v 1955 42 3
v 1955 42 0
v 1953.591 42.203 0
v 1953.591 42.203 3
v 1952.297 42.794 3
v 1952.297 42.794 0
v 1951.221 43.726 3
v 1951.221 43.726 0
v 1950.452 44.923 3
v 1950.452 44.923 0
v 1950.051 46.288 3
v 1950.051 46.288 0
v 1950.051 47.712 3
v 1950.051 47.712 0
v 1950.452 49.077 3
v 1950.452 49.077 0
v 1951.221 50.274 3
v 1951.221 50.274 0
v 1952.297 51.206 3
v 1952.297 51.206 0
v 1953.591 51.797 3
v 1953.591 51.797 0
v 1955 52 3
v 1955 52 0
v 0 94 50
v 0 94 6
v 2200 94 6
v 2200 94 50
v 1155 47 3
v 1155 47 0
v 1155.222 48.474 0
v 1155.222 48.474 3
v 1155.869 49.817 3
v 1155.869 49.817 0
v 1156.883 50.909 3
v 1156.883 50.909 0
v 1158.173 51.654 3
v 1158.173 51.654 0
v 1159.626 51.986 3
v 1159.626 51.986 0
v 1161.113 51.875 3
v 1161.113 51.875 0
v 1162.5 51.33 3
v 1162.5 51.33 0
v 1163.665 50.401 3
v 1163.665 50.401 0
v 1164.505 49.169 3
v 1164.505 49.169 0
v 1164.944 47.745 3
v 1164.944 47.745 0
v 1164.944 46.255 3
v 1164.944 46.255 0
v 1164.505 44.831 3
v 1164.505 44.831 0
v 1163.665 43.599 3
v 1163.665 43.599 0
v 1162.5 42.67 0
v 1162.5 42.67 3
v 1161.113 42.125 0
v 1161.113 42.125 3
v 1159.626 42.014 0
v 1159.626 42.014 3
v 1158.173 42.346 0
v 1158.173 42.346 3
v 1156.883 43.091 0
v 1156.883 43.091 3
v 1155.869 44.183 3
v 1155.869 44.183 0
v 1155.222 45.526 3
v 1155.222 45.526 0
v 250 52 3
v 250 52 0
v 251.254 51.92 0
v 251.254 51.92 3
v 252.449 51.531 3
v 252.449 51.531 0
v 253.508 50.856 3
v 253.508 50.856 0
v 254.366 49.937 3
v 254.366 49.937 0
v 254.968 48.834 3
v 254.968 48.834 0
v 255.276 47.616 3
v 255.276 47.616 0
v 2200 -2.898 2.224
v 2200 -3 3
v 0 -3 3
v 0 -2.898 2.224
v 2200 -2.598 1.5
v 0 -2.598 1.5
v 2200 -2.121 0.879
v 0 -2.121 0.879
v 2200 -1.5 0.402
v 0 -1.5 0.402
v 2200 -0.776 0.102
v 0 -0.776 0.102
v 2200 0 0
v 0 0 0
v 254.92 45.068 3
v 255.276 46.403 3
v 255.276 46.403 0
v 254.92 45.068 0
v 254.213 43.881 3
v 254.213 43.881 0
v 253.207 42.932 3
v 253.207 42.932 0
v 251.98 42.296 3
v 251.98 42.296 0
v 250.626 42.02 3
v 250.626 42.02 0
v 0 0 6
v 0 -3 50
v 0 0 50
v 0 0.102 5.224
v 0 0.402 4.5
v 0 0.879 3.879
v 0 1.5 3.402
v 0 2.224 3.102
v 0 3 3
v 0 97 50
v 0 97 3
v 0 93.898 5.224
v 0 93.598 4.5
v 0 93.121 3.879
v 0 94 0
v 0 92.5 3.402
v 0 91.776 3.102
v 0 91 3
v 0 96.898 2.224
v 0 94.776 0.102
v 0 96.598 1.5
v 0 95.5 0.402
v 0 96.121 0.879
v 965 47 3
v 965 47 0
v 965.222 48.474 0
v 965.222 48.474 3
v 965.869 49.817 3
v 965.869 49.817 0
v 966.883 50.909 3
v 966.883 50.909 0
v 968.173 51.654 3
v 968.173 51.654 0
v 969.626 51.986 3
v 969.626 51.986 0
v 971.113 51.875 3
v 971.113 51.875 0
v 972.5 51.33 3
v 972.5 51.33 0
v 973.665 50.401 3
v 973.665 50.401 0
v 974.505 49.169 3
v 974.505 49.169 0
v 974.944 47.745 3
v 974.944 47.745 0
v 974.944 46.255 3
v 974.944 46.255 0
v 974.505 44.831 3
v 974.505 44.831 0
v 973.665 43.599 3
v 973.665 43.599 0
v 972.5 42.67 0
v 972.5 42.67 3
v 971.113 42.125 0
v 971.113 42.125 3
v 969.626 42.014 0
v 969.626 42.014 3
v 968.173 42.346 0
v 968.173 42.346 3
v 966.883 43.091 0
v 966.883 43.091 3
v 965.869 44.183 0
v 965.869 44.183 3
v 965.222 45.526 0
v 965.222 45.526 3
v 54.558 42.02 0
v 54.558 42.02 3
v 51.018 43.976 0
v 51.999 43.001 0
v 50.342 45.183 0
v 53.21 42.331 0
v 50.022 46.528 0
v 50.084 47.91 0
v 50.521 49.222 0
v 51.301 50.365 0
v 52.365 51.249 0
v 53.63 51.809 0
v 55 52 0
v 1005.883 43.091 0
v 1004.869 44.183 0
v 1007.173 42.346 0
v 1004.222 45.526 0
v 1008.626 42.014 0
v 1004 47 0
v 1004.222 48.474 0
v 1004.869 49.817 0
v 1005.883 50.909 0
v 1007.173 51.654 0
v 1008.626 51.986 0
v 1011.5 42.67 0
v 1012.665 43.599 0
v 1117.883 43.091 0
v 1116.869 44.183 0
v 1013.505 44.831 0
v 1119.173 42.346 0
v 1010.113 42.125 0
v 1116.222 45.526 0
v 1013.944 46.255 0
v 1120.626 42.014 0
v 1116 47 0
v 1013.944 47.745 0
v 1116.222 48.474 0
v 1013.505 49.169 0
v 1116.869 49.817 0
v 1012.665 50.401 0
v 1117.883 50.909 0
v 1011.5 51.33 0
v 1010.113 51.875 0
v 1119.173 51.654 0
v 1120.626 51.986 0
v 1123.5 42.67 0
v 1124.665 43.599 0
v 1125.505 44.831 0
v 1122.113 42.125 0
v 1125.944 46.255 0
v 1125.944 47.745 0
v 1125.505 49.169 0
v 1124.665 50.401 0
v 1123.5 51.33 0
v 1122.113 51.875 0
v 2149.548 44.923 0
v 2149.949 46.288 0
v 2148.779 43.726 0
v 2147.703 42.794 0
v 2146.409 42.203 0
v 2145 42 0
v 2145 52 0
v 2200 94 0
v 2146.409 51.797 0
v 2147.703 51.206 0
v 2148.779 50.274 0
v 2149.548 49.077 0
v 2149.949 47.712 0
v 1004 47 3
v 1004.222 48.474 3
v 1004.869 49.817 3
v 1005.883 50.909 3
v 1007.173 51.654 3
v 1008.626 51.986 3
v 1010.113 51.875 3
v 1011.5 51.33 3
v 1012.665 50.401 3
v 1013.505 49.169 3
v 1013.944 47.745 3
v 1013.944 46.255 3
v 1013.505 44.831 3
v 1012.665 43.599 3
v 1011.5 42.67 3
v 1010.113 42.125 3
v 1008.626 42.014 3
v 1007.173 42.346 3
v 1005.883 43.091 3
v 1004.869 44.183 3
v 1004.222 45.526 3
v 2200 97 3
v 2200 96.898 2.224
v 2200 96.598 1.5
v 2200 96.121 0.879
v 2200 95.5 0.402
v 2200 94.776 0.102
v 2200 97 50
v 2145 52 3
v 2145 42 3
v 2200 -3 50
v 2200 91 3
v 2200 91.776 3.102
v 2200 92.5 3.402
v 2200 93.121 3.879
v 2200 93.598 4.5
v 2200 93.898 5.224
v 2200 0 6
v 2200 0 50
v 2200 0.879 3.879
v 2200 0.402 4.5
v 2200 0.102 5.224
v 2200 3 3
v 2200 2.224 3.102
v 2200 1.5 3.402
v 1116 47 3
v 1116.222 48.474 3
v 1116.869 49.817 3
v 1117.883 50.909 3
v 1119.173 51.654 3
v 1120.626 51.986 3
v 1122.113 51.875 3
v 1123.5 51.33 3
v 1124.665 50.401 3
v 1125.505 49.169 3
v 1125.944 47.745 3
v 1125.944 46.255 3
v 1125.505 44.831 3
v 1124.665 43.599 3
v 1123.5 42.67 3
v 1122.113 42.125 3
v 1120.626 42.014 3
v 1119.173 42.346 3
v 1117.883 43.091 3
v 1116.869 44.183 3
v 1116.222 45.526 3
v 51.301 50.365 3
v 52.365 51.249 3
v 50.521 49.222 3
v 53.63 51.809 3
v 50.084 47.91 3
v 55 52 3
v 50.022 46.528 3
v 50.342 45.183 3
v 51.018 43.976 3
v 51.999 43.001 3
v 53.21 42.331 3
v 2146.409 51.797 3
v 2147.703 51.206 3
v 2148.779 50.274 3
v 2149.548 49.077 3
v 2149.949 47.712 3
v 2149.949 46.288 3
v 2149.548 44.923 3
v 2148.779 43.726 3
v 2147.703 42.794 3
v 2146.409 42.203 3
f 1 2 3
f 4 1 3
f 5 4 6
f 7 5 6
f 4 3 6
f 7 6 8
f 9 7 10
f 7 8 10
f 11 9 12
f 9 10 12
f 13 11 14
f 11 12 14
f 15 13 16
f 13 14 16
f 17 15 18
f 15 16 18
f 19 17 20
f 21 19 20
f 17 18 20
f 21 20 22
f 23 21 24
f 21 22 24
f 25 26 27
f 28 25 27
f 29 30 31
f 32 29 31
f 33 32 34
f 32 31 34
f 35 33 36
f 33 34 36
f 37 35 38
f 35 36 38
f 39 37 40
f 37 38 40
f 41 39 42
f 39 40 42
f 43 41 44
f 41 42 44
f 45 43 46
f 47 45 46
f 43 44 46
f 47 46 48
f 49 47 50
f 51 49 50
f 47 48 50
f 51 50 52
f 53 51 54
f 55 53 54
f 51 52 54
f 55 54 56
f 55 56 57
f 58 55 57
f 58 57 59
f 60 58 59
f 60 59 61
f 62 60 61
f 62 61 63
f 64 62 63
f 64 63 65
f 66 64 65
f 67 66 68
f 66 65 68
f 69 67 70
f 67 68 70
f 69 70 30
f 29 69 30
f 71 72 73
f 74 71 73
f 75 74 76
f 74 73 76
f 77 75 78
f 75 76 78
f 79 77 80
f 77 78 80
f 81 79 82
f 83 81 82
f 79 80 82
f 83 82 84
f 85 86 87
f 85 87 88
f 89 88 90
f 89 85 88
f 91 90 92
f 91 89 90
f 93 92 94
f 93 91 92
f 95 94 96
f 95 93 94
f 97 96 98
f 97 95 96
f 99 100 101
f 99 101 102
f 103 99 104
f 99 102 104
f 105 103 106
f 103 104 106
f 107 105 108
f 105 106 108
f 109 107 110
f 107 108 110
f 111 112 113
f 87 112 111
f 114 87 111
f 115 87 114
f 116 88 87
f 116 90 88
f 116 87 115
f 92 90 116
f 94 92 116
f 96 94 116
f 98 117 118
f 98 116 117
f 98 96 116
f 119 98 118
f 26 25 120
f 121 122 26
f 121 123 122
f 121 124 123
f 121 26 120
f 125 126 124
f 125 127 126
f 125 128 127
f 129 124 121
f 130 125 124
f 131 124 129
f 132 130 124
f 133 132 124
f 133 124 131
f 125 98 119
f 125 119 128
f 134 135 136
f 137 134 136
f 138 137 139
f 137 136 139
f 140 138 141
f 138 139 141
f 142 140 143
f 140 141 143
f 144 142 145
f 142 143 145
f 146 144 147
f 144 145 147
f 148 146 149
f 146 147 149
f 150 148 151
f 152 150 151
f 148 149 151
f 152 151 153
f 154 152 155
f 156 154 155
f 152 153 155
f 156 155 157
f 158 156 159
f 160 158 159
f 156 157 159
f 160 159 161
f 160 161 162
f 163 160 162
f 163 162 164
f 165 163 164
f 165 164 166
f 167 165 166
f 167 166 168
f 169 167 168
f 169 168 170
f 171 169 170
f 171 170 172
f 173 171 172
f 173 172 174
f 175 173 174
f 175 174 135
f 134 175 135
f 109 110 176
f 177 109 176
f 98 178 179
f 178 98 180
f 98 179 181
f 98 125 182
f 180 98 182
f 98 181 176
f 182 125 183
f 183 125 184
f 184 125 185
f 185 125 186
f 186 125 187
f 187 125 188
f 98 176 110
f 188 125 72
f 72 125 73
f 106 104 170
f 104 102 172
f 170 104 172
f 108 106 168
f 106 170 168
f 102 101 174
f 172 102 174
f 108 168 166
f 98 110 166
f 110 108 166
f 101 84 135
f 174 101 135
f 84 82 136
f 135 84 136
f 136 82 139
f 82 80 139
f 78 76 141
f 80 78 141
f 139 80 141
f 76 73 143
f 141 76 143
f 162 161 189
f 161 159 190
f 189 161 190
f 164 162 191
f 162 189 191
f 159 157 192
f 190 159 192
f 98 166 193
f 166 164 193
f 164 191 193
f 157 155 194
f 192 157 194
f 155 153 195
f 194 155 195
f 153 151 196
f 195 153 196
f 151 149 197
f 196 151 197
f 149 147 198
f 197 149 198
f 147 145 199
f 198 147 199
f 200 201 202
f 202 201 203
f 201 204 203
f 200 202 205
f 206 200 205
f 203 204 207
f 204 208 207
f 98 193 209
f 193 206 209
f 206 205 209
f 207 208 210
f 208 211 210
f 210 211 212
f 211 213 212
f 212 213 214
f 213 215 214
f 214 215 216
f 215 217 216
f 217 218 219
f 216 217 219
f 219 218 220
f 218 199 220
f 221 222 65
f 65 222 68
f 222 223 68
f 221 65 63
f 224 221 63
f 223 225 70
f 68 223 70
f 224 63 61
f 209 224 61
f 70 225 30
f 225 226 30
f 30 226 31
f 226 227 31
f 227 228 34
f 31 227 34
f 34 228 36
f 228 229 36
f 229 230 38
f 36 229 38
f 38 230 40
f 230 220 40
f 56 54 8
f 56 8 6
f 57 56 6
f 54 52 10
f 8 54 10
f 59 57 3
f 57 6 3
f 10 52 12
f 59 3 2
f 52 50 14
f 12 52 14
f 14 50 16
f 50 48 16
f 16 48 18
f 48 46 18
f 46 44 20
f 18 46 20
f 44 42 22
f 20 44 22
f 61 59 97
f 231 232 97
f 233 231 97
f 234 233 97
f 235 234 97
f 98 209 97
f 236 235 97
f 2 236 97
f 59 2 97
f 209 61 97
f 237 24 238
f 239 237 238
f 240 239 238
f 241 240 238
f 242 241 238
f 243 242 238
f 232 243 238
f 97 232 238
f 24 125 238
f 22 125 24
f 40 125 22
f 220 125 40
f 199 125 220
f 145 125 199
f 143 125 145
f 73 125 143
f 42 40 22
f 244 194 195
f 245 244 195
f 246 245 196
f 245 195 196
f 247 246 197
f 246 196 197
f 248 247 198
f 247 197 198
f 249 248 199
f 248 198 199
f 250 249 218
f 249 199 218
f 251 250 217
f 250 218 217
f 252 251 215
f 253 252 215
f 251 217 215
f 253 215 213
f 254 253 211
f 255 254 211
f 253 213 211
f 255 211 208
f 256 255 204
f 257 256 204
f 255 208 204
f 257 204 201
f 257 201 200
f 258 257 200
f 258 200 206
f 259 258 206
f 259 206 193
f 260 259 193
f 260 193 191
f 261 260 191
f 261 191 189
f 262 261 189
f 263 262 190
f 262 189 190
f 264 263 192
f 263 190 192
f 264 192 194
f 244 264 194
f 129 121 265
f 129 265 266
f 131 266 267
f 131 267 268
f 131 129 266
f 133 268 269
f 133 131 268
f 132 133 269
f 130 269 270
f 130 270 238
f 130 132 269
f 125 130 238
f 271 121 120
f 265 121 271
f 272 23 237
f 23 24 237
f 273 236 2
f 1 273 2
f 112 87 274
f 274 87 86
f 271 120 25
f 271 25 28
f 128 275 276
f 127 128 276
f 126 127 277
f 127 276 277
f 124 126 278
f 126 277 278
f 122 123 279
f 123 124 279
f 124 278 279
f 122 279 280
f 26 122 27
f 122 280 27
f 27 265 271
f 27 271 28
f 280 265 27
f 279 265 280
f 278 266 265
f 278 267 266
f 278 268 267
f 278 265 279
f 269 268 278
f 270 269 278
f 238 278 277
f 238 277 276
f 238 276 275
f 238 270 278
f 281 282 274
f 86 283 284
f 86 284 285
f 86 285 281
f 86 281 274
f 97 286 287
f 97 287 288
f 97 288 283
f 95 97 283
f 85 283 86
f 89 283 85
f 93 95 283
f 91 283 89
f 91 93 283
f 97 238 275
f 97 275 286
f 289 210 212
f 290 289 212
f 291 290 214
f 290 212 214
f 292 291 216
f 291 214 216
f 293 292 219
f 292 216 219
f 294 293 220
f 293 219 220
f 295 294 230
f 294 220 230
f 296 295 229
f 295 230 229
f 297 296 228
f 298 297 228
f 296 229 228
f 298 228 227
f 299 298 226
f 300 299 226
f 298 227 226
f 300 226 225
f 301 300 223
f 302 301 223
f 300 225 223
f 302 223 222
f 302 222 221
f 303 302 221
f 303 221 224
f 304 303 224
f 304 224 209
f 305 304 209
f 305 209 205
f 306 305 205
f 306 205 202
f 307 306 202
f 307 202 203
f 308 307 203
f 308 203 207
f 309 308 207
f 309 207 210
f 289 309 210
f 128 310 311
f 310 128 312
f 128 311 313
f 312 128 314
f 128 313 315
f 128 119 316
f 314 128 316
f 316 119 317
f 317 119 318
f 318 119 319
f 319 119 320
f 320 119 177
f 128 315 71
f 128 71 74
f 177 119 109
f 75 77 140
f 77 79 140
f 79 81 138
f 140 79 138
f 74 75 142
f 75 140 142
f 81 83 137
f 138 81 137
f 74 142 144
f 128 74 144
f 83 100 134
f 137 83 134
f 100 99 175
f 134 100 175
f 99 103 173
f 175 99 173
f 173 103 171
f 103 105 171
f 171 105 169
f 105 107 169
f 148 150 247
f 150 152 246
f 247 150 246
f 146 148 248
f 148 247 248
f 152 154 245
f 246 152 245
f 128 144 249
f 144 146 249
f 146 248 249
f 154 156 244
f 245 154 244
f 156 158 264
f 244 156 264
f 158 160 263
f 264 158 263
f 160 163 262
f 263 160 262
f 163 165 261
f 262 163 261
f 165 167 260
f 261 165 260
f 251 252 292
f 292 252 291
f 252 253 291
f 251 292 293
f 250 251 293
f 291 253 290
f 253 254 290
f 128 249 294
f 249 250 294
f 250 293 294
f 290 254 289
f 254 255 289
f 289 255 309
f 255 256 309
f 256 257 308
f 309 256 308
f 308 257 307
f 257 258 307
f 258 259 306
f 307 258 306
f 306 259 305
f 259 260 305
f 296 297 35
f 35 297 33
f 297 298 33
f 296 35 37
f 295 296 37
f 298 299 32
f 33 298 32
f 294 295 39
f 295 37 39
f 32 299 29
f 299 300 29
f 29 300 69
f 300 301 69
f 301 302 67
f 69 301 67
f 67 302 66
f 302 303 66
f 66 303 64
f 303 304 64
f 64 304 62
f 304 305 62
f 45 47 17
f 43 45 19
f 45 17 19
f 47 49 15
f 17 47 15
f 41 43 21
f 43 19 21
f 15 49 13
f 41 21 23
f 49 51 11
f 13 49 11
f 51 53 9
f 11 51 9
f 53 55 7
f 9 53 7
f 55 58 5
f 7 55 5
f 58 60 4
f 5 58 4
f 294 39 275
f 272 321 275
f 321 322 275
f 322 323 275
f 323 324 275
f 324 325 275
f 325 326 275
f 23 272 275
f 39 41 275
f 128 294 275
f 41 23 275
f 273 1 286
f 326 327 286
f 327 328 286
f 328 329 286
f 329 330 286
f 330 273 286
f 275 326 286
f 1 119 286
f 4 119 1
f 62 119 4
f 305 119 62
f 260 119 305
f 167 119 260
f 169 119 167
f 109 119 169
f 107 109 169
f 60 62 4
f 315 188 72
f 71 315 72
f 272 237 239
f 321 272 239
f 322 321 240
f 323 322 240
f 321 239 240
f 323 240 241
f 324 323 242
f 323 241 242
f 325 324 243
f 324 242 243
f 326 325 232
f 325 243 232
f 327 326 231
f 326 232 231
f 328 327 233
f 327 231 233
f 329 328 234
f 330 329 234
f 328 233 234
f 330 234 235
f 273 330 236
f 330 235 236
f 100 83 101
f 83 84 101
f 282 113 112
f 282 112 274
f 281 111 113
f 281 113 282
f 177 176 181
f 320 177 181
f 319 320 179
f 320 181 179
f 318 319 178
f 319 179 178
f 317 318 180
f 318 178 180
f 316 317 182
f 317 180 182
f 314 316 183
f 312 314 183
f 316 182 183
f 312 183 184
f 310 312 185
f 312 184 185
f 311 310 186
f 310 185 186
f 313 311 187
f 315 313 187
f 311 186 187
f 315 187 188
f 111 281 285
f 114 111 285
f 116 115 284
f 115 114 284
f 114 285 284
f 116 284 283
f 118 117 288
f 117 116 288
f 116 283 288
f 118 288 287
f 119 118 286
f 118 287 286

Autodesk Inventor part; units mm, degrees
ref_plane "YZ Plane" through (0, 0, 0) normal (1, 0, 0) x (0, 1, 0)
ref_plane "XZ Plane" through (0, 0, 0) normal (0, 1, 0) x (-1, 0, 0)
ref_plane "XY Plane" through (0, 0, 0) normal (0, 0, 1) x (1, 0, 0)
sketch "Sketch1" plane through (0, 0, 0) normal (0, 0, 1) x (1, 0, 0)
  line L0 (0, 0) -> (2200, 0)
  line L1 (0, 0) -> (0, -3)
  line L2 (0, -3) -> (2200, -3)
  line L3 (2200, -3) -> (2200, 0)
  dimension "d0" = 2200
  dimension "d1" = 3
  dimension "d2" = 2200
extrude "Extrusion1" add sketch "Sketch1" along normal blind 50
sketch "Sketch2" plane through (0, 0, 0) normal (0, 1, 0) x (1, 0, 0)
  line L0 (0, 0) -> (0, -50) projected
  line L1 (0, -3) -> (2200, -3)
  line L2 (2200, 0) -> (0, 0) projected
  line L3 (0, -3) -> (0, 0)
  line L4 (0, 0) -> (2200, 0)
  line L5 (2200, 0) -> (2200, -50) projected
  line L6 (2200, 0) -> (2200, -3)
  dimension "d5" = 2200
  dimension "d6" = 3
extrude "Extrusion2" add sketch "Sketch2" along normal blind 97
sketch "Sketch3" plane through (0, 0, 3) normal (0, 0, 1) x (1, 0, 0)
  line L0 (0, -3) -> (0, 97) projected
  line L1 (0, 94) -> (2200, 94)
  line L2 (0, 97) -> (2200, 97) projected
  line L3 (0, 94) -> (0, 97)
  line L4 (0, 97) -> (2200, 97)
  line L5 (2200, 97) -> (2200, 94)
  point P0 (0, 0)
  dimension "d9" = 3
  dimension "d10" = 2200
extrude "Extrusion3" add sketch "Sketch3" along normal blind 47
fillet "Fillet1" radius 3 4 edges at (1100, -3, 0) (1100, 97, 0) (1100, 0, 3) (1100, 94, 3)
sketch "Sketch4" plane through (0, 0, 0) normal (0, 0, -1) x (-1, 0, 0)
  line L0 (0, 0) -> (0, 94) projected
  line L1 (-55, 52) -> (-250, 52)
  line L2 (-255.2761, 47.6162) -> (-255.2761, 46.4034)
  line L3 (-250.626, 42.0196) -> (-54.5576, 42.0196)
  arc A0 (-250, 52) -> (-250, 42.0196) centre (-250.313, 47.0098) ccw
  arc A1 (-55.4424, 42.0196) -> (-55, 52) centre (-55, 47) ccw
  dimension "d16" = 10
extrude "Extrusion4" cut sketch "Sketch4" against normal through all contours A1 L3 A0 L2 L1
sketch "Sketch5" plane through (0, 0, 0) normal (0, 0, -1) x (-1, 0, 0)
  line L0 (-2200, 3) -> (-2200, 91) projected
  line L1 (-2145, 42) -> (-1955, 42)
  line L2 (-1955, 52) -> (-2145, 52)
  arc A0 (-2145, 52) -> (-2145, 42) centre (-2145, 47) ccw
  arc A1 (-1955, 42) -> (-1955, 52) centre (-1955, 47) ccw
  point P0 (0, 0)
extrude "Extrusion5" cut sketch "Sketch5" against normal blind 10
sketch "Sketch8" plane through (0, 0, 0) normal (0, 0, -1) x (-1, 0, 0)
  point P0 (0, 0)
sketch "Sketch9" plane through (0, 0, 0) normal (0, 0, -1) x (-1, 0, 0)
  arc A0 (-1155, 52) -> (-1165, 52) centre (-1160, 52) ccw
  arc A1 (-1116, 52) -> (-1126, 52) centre (-1121, 52) ccw
  arc A2 (-1004, 52) -> (-1014, 52) centre (-1009, 52) ccw
  arc A3 (-965, 52) -> (-975, 52) centre (-970, 52) ccw
  line L0 (-1160, 52) -> (-1160, 47)
  circle A4 centre (-1160, 47) radius 5
  line L1 (-1160, 47) -> (-965, 47)
  line L2 (-1121, 57) -> (-1121, 47)
  line L3 (-1009, 57) -> (-1009, 47)
  line L4 (-970, 57) -> (-970, 47)
  circle A5 centre (-1121, 47) radius 5
  circle A6 centre (-1009, 47) radius 5
  circle A7 centre (-970, 47) radius 5
  point P0 (0, 0)
extrude "Extrusion7" cut sketch "Sketch9" against normal through all
properties part number "ThanhKe"
